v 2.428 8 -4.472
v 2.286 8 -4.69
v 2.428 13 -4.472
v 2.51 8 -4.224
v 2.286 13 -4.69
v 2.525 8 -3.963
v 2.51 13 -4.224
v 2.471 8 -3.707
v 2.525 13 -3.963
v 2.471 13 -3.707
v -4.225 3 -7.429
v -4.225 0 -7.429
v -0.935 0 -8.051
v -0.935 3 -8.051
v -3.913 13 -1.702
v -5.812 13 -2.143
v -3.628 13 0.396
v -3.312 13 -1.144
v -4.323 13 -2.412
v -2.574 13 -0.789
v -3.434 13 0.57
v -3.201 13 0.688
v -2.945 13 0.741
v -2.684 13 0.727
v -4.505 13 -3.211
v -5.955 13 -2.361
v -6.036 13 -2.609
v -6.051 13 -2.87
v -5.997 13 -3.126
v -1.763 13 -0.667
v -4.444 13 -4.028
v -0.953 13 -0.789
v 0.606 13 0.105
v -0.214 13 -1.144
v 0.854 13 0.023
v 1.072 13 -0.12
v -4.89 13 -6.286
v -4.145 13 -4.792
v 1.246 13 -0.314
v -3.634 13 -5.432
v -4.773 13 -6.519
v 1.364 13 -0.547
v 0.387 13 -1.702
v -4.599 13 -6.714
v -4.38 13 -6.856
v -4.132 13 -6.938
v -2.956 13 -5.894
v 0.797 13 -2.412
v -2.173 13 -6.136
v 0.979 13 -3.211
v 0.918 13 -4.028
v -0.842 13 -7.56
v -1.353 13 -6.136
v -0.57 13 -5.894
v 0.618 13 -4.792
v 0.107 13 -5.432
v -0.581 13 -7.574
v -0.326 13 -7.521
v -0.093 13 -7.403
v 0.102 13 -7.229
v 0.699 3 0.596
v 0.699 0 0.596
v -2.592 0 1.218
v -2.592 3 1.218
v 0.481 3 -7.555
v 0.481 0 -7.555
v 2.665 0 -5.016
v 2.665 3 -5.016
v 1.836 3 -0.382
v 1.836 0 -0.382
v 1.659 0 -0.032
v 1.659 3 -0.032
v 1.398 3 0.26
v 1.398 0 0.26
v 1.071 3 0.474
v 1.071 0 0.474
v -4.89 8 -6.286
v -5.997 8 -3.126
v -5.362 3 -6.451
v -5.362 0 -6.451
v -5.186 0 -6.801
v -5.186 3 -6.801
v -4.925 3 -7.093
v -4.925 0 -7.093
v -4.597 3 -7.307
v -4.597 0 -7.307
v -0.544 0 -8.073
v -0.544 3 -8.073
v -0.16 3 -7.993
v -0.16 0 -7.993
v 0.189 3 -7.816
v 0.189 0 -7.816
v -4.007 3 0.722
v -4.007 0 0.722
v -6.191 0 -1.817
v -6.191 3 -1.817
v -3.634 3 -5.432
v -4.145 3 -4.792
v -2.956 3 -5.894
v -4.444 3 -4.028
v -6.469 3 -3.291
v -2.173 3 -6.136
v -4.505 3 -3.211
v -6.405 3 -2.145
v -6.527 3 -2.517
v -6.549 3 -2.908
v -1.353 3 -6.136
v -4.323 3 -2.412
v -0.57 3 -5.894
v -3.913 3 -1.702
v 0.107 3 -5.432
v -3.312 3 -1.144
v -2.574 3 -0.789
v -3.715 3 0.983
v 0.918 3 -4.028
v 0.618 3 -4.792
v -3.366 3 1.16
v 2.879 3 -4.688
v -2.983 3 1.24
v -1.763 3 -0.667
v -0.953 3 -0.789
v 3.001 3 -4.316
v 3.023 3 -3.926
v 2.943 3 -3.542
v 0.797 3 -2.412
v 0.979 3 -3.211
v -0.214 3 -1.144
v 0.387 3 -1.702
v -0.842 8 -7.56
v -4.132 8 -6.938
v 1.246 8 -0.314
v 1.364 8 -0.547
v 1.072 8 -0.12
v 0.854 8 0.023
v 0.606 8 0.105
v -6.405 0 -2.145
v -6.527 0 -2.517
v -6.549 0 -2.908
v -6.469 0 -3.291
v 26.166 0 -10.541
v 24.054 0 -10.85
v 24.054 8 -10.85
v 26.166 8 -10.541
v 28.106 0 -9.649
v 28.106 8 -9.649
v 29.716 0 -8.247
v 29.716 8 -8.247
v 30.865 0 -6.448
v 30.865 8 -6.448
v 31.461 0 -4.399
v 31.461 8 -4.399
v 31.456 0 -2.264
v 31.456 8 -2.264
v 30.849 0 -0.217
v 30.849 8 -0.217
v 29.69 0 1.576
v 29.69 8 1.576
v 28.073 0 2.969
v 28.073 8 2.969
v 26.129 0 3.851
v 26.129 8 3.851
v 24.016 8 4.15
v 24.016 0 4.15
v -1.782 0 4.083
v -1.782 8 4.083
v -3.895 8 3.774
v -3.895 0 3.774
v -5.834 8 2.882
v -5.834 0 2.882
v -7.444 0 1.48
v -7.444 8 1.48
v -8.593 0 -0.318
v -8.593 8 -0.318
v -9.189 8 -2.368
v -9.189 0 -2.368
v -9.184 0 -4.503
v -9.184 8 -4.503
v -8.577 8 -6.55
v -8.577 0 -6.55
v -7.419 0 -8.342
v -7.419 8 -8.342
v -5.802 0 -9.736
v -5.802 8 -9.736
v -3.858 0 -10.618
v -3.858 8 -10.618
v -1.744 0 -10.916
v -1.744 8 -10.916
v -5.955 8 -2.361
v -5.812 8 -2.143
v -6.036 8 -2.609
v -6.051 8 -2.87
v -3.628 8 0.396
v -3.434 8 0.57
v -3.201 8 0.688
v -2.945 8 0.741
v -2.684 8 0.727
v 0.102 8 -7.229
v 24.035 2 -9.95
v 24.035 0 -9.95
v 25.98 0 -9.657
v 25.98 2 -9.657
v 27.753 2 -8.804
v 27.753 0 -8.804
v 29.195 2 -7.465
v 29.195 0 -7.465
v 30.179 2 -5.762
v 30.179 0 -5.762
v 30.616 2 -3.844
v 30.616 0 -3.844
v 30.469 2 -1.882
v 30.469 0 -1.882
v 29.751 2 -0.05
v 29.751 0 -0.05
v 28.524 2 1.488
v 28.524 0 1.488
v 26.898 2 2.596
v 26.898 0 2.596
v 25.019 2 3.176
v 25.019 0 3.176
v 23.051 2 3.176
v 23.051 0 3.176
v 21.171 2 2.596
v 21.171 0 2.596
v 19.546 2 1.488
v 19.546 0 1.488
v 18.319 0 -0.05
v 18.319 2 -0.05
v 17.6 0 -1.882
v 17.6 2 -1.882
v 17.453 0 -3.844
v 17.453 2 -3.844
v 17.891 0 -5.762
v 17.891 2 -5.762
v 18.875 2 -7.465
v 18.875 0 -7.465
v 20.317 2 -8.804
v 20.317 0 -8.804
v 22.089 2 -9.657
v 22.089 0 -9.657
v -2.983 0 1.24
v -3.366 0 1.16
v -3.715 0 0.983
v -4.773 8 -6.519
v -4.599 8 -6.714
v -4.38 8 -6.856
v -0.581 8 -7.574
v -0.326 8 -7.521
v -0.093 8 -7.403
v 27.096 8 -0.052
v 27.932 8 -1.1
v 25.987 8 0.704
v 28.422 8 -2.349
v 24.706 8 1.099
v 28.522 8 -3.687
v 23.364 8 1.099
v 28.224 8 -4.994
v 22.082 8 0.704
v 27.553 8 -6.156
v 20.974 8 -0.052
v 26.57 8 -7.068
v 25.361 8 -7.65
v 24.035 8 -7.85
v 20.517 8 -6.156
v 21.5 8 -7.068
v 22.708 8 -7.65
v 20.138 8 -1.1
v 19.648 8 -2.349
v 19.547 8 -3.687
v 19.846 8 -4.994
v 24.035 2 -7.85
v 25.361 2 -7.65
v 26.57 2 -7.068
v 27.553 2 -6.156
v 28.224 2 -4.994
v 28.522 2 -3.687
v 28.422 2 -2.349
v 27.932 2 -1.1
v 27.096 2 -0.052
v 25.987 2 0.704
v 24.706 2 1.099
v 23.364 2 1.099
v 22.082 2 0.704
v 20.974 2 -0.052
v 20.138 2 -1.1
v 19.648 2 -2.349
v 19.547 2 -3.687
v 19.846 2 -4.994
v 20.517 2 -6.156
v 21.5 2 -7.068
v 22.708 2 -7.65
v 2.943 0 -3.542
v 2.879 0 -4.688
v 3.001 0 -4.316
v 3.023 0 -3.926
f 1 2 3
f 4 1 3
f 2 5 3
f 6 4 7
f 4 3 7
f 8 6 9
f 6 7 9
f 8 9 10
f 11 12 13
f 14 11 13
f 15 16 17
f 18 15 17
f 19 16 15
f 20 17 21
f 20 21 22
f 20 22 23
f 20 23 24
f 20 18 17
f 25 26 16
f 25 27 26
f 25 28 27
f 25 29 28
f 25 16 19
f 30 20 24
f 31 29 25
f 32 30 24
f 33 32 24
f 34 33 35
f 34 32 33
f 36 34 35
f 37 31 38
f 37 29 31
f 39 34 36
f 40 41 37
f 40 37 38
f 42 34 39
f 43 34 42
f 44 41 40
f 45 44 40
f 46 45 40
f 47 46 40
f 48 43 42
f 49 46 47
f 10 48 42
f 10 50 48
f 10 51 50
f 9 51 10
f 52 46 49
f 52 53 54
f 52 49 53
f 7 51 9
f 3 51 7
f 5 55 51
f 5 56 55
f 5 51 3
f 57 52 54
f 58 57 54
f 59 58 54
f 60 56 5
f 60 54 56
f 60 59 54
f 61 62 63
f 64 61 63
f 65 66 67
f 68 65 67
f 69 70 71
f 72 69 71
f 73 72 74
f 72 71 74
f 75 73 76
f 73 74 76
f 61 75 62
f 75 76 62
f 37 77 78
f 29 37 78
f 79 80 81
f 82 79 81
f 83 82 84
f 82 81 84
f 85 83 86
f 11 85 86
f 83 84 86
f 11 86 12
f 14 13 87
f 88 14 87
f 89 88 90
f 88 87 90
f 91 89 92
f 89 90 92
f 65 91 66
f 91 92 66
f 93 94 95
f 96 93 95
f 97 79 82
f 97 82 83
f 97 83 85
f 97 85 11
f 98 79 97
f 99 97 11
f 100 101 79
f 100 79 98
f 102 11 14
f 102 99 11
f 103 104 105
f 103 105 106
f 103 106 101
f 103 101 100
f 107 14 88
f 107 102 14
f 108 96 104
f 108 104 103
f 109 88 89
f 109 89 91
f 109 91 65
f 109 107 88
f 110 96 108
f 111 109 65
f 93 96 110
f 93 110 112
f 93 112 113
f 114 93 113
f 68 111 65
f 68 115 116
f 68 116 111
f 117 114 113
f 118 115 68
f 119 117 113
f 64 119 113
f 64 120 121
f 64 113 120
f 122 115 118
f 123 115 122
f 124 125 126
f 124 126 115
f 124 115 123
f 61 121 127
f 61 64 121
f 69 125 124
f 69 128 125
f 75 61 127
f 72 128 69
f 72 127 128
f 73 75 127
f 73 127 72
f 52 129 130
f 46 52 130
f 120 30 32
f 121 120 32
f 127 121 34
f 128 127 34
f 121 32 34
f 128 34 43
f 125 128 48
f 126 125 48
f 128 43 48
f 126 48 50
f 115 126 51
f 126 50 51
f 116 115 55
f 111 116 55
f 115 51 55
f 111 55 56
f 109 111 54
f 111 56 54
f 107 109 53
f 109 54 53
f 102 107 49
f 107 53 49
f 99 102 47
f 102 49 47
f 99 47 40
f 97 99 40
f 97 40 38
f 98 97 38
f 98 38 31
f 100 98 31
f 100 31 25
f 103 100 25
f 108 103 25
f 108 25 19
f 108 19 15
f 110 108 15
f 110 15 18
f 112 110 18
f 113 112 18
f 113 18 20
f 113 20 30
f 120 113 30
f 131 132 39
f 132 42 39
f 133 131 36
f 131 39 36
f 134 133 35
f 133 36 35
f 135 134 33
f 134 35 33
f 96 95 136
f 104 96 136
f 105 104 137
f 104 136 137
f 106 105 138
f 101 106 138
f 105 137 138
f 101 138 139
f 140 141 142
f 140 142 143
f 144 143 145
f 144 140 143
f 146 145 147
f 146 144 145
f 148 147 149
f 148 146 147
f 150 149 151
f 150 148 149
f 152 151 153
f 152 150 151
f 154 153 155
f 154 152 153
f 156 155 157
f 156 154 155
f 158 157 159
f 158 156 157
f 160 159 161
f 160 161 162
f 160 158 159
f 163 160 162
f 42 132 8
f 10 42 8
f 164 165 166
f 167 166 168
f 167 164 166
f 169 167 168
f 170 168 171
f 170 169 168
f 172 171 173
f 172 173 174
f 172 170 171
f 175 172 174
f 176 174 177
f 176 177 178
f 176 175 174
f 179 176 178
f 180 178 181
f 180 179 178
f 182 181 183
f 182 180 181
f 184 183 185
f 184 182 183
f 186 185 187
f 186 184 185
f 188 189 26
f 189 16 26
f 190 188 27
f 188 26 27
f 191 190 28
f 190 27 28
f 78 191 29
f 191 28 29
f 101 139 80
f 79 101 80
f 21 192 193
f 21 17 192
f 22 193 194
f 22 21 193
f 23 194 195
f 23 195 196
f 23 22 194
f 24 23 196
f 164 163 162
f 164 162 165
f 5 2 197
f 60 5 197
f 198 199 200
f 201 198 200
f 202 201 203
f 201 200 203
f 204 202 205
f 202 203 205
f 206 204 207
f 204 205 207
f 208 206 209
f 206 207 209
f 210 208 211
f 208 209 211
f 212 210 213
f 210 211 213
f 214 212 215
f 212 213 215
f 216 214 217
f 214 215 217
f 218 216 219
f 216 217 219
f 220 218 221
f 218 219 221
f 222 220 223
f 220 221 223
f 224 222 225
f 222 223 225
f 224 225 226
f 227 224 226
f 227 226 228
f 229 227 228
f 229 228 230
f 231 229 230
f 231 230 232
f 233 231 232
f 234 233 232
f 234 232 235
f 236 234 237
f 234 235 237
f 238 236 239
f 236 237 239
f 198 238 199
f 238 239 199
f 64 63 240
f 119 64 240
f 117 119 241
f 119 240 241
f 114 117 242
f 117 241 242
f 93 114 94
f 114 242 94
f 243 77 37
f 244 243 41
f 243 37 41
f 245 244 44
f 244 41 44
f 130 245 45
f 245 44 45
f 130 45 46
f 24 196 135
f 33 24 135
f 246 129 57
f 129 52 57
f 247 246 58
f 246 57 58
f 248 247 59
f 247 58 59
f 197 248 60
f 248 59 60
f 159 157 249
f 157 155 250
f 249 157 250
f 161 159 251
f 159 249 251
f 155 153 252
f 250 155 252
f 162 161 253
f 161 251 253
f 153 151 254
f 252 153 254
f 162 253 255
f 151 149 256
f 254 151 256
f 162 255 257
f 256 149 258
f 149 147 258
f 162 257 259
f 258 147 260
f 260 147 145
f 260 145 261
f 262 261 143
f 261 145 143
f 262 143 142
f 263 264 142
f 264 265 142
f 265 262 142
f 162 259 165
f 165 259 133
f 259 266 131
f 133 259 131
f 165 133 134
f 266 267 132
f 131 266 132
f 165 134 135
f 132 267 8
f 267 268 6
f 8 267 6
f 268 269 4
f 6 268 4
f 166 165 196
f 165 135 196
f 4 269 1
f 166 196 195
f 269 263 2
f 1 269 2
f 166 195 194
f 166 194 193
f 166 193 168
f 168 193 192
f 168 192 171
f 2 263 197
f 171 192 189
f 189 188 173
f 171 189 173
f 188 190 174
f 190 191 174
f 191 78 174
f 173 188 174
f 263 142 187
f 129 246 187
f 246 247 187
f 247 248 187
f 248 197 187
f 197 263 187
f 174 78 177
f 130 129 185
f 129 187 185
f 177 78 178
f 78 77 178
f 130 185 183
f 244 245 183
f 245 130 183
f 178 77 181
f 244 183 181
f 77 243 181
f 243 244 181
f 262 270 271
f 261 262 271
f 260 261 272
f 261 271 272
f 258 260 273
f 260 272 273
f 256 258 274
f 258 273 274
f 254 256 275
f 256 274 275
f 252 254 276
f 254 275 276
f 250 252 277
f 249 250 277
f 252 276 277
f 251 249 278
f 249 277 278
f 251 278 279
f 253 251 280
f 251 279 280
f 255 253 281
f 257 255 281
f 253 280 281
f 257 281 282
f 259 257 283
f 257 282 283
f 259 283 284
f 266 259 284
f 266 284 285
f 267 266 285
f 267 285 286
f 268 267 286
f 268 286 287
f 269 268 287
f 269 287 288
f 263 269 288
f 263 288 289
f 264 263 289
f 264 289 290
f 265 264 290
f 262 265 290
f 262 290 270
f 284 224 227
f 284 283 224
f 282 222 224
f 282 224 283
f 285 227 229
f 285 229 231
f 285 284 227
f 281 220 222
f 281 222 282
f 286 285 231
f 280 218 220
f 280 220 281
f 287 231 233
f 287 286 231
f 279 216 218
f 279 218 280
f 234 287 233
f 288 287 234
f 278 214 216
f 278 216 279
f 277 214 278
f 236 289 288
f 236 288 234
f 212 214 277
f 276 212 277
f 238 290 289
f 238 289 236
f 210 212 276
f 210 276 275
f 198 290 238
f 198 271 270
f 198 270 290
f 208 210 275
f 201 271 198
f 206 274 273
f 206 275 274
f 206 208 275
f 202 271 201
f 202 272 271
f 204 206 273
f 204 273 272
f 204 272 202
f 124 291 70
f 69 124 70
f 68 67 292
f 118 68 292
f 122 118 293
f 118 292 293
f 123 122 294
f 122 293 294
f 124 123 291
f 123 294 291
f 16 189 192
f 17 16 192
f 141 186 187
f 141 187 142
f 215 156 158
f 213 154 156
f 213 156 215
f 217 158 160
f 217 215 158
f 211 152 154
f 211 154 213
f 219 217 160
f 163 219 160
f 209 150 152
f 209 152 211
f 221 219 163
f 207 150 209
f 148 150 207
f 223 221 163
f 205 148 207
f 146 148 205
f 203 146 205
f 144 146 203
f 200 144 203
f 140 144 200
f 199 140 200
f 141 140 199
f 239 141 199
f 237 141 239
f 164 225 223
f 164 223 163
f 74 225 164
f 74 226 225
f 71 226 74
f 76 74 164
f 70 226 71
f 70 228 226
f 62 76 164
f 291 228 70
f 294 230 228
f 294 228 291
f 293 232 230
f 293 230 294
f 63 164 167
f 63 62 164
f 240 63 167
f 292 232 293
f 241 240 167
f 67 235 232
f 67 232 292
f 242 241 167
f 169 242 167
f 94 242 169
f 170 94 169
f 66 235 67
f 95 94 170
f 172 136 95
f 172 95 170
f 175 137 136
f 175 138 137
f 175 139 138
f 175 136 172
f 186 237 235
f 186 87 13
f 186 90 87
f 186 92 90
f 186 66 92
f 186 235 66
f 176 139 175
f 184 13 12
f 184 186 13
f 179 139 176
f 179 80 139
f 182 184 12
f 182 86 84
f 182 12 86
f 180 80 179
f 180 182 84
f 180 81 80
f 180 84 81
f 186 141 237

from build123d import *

# Parameters (mm, degrees)
BOSS_EXTRUDE1_DEPTH = 8
BOSS_EXTRUDE2_DEPTH = 5
SKETCH3_R           = 2.75
CUT_EXTRUDE1_DEPTH  = 36.813646862
FILLET1_R           = 1
CUT_EXTRUDE2_DEPTH  = 3
SKETCH5_R           = 6.6
CUT_EXTRUDE3_DEPTH  = 2
SKETCH6_R           = 4.5
CUT_EXTRUDE4_DEPTH  = 36.137121418


with BuildPart() as part:
    # Sketch1 → Boss-Extrude1 (new body)
    with BuildSketch(Plane(origin=(0, 0, 0), x_dir=(1, 0, 0), z_dir=(0, 1, 0))):
        with BuildLine():
            Line((24.015632569, -4.149601491), (-1.78233066, -4.083471877))
            ThreePointArc((-1.78233066, -4.083471877), (-9.26308084, 3.435728662), (-1.743880301, 10.916478842))
            Line((-1.743880301, 10.916478842), (24.054082929, 10.850349227))
            ThreePointArc((24.054082929, 10.850349227), (31.534833108, 3.331148688), (24.015632569, -4.149601491))
        make_face()
    extrude(amount=BOSS_EXTRUDE1_DEPTH)

    # Sketch2 → Boss-Extrude2 (add)
    with BuildSketch(Plane(origin=(0, 8, 0), x_dir=(1, 0, 0), z_dir=(0, 1, 0))):
        Polygon((-3.25175247, -0.833664766), (1.173324698, 0.002213248), (2.661971688, 4.252381497), (-0.274458491, 7.666671731), (-4.69953566, 6.830793717), (-6.188182649, 2.580625468), align=None)
    extrude(amount=BOSS_EXTRUDE2_DEPTH)

    # Sketch3 → Cut-Extrude1 (cut, through all)
    with BuildSketch(Plane(origin=(0, 13, 0), x_dir=(1, 0, 0), z_dir=(0, 1, 0))):
        with Locations(Location((-1.763105481, 3.416503482, 0), (0, 0, 270))):
            Circle(SKETCH3_R)
    extrude(amount=-CUT_EXTRUDE1_DEPTH, mode=Mode.SUBTRACT)

    # Fillet1
    fillet1_edges = [part.edges().sort_by_distance(p)[0] for p in [
        (-6.188182649, 10.5, -2.580625468),
        (-3.25175247, 10.5, 0.833664766),
        (1.173324698, 10.5, -0.002213248),
        (2.661971688, 10.5, -4.252381497),
        (-0.274458491, 10.5, -7.666671731),
        (-4.69953566, 10.5, -6.830793717),
    ]]
    fillet(fillet1_edges, radius=FILLET1_R)

    # Sketch4 → Cut-Extrude2 (cut)
    with BuildSketch(Plane.XZ):
        with BuildLine():
            Line((2.943011006, -3.542205297), (1.836068373, -0.381823779))
            ThreePointArc((1.836068373, -0.381823779), (1.398479703, 0.259582363), (0.698813727, 0.596262041))
            Line((0.698813727, 0.596262041), (-2.59162827, 1.217812359))
            ThreePointArc((-2.59162827, 1.217812359), (-3.365896618, 1.159552526), (-4.00730276, 0.721963855))
            Line((-4.00730276, 0.721963855), (-6.190802123, -1.816867345))
            ThreePointArc((-6.190802123, -1.816867345), (-6.527481801, -2.51653332), (-6.469221968, -3.290801668))
            Line((-6.469221968, -3.290801668), (-5.362279334, -6.451183186))
            ThreePointArc((-5.362279334, -6.451183186), (-4.924690664, -7.092589328), (-4.225024689, -7.429269006))
            Line((-4.225024689, -7.429269006), (-0.934582692, -8.050819324))
            ThreePointArc((-0.934582692, -8.050819324), (-0.160314344, -7.99255949), (0.481091798, -7.55497082))
            Line((0.481091798, -7.55497082), (2.664591162, -5.01613962))
            ThreePointArc((2.664591162, -5.01613962), (3.00127084, -4.316473645), (2.943011006, -3.542205297))
        make_face()
    extrude(amount=-CUT_EXTRUDE2_DEPTH, mode=Mode.SUBTRACT)

    # Sketch5 → Cut-Extrude3 (cut)
    with BuildSketch(Plane.XZ):
        with Locations(Location((24.034857749, -3.350373868, 0), (0, 0, 270))):
            Circle(SKETCH5_R)
    extrude(amount=-CUT_EXTRUDE3_DEPTH, mode=Mode.SUBTRACT)

    # Sketch6 → Cut-Extrude4 (cut, through all)
    with BuildSketch(Plane.XZ.offset(-2)):
        with Locations(Location((24.034857749, -3.350373868, 0), (0, 0, 270))):
            Circle(SKETCH6_R)
    extrude(amount=-CUT_EXTRUDE4_DEPTH, mode=Mode.SUBTRACT)


solid = part.part
